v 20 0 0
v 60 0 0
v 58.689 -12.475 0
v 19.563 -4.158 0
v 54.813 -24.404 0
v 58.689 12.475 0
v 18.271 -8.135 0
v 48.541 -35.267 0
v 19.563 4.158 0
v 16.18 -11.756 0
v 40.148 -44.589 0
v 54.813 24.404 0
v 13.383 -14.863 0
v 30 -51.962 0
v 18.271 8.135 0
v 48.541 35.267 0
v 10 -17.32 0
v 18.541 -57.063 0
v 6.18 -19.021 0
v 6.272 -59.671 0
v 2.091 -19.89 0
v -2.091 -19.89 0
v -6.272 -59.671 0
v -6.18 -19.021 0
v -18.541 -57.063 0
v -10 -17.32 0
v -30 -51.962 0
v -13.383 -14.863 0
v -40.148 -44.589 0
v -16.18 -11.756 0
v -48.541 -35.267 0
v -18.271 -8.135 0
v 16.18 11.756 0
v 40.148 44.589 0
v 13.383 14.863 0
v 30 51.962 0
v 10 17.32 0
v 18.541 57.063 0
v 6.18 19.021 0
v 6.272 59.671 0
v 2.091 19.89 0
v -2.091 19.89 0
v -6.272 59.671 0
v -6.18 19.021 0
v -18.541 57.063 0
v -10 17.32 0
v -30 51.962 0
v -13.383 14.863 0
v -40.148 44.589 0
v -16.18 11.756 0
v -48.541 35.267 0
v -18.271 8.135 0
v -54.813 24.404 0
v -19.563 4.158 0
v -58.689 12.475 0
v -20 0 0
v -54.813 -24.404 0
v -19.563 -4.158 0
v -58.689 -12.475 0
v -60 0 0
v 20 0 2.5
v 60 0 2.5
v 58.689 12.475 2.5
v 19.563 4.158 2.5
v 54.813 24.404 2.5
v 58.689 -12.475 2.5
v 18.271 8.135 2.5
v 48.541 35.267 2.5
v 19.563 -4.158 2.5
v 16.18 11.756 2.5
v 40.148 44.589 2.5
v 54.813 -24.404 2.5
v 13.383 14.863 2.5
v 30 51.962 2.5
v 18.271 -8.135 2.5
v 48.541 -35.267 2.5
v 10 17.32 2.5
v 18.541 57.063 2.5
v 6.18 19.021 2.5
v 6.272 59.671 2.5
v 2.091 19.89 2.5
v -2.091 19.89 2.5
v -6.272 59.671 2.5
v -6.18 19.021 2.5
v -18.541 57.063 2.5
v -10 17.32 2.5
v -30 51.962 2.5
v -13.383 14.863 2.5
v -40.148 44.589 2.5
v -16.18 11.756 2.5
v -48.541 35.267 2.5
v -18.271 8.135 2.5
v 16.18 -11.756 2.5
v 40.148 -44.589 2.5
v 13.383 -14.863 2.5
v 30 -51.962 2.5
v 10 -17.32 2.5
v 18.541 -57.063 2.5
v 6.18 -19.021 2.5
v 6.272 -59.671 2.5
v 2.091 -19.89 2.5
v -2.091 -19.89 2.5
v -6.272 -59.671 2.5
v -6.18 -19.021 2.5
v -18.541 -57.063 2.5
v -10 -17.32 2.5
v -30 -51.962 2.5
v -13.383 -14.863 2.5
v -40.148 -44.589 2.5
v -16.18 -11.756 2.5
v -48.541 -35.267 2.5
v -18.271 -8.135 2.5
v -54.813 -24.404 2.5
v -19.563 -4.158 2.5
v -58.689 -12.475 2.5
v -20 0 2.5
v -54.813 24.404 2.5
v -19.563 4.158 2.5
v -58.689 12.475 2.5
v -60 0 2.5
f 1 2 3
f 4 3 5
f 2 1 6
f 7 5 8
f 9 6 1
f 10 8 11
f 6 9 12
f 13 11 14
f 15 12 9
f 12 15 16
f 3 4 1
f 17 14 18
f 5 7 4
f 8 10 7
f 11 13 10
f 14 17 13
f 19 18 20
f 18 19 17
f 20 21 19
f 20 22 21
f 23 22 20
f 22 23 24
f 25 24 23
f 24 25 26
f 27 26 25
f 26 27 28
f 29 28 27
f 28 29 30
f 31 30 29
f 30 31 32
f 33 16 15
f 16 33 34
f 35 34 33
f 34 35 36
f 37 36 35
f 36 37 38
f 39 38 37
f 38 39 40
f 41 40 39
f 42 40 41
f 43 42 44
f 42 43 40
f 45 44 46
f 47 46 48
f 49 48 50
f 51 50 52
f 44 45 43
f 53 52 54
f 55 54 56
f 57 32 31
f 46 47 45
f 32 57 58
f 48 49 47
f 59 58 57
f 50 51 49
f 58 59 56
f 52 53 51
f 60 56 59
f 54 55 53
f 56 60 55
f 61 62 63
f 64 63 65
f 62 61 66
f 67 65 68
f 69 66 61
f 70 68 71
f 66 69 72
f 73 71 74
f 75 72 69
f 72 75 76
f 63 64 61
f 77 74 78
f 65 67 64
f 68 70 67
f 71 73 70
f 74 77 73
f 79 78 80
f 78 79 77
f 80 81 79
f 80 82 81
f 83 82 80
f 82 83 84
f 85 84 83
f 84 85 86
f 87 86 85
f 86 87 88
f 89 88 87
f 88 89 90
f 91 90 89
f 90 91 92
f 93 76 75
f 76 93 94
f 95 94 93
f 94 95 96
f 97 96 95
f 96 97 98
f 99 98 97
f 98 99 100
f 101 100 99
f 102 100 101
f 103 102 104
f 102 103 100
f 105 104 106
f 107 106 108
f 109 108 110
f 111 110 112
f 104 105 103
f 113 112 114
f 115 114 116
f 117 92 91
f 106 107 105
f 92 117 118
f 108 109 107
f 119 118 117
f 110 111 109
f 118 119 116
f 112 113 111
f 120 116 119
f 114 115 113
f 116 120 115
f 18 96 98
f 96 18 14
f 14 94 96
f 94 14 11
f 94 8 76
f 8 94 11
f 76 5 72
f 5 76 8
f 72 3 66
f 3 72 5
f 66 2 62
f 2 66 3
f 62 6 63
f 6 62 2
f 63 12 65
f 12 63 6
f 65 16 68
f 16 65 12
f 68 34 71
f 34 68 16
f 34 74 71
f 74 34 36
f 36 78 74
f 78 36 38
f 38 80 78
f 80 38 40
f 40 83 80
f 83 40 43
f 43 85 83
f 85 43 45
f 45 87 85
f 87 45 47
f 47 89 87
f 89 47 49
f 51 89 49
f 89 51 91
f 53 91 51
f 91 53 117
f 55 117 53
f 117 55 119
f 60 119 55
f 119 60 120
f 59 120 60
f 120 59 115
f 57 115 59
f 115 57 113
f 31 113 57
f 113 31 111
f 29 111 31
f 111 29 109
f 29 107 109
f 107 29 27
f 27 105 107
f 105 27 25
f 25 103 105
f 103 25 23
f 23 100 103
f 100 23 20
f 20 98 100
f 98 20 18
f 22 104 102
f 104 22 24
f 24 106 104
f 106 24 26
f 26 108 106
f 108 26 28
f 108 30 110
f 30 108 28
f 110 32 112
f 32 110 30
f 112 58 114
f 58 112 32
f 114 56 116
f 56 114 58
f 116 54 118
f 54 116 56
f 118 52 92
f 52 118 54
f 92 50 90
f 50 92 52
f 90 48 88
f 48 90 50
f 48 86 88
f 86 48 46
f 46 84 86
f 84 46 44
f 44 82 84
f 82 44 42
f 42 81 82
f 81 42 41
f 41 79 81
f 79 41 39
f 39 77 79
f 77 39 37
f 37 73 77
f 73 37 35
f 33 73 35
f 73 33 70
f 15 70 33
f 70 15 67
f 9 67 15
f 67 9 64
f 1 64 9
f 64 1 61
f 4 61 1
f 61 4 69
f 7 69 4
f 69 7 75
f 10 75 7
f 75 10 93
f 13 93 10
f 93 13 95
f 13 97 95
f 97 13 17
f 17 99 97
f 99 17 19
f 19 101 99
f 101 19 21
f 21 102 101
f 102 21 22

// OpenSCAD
// rotor.scad — Parametric scalloped/slotted chopper wheel
// Inspired by a corrugated foil ring. Suitable for STL/DXF export.
// (c) 2025 PhotonChopper-Lab — MIT License

// ===== User parameters =====
outer_d = 120;        // outer diameter (mm)
inner_d = 40;         // inner diameter/hub bore (mm)
thickness = 2.5;      // disk thickness (mm)
N_teeth = 300;        // number of teeth == number of gaps
duty = 0.5;           // gap fraction of pitch [0.3..0.7]
scallop_depth = 2;    // radial scallop amplitude (mm)
hub_d = 20;           // hub clamp bore (mm)
hub_bolt_circle = 28; // for 3x M3 bolts
hub_bolt_d = 3.2;
hub_bolts = 3;

// ===== Derived =====
pitch_deg = 360/N_teeth;
gap_deg = pitch_deg*duty;
tooth_deg = pitch_deg - gap_deg;

module scalloped_radius(angle){
    // Simple cosine scallop around the rim
    // angle in degrees
    amp = scallop_depth;
    base = outer_d/2;
    r = base - amp*(1 - cos( (angle)*2*PI/ pitch_deg))/2;
    circle(r=r);
}

module ring_outline(){
    difference(){
        // outer contour with scallop
        rotate_extrude(convexity=10)
            translate([outer_d/2,0,0]) square([0.01, thickness], center=true); // base
        // inner bore
        circle(d=inner_d);
        // slots
        for(i=[0:N_teeth-1]){
            rotate(i*pitch_deg)
                polygon(points=[
                    [inner_d/2,0],
                    [outer_d/2,0],
                    [outer_d/2,0],
                    [inner_d/2,0]
                ]);
        }
    }
}

// We'll construct slots by subtracting angular windows
module slotted_disc(){
    difference(){
        linear_extrude(height=thickness)
            difference(){
                circle(d=outer_d);
                circle(d=inner_d);
            }
        // subtract gaps
        for(i=[0:N_teeth-1]){
            rotate([0,0,i*pitch_deg + tooth_deg]) // place gap after tooth
                translate([0,0,-1])
                    linear_extrude(height=thickness+2)
                        offset(r=0)
                            arc_sector(inner_d/2, outer_d/2, gap_deg);
        }
    }
}

// helper: 2D arc sector
module arc_sector(r1, r2, ang){
    // ang in degrees, centered at 0 degrees
    rotate(-ang/2)
        difference(){
            circle(r=r2);
            circle(r=r1);
            rotate(ang) translate([-2*r2,-2*r2]) square([4*r2,4*r2]);
            translate([-2*r2,-2*r2]) square([4*r2,4*r2]);
        }
}

module hub_holes(){
    for (i=[0:hub_bolts-1]){
        rotate(i*360/hub_bolts) translate([hub_bolt_circle/2,0,0])
            cylinder(h=thickness+1, d=hub_bolt_d, center=true);
    }
}

// Final assembly
difference(){
    slotted_disc();
    // hub bore
    cylinder(h=thickness+1, d=hub_d, center=true);
    // bolt circle
    hub_holes();
}
